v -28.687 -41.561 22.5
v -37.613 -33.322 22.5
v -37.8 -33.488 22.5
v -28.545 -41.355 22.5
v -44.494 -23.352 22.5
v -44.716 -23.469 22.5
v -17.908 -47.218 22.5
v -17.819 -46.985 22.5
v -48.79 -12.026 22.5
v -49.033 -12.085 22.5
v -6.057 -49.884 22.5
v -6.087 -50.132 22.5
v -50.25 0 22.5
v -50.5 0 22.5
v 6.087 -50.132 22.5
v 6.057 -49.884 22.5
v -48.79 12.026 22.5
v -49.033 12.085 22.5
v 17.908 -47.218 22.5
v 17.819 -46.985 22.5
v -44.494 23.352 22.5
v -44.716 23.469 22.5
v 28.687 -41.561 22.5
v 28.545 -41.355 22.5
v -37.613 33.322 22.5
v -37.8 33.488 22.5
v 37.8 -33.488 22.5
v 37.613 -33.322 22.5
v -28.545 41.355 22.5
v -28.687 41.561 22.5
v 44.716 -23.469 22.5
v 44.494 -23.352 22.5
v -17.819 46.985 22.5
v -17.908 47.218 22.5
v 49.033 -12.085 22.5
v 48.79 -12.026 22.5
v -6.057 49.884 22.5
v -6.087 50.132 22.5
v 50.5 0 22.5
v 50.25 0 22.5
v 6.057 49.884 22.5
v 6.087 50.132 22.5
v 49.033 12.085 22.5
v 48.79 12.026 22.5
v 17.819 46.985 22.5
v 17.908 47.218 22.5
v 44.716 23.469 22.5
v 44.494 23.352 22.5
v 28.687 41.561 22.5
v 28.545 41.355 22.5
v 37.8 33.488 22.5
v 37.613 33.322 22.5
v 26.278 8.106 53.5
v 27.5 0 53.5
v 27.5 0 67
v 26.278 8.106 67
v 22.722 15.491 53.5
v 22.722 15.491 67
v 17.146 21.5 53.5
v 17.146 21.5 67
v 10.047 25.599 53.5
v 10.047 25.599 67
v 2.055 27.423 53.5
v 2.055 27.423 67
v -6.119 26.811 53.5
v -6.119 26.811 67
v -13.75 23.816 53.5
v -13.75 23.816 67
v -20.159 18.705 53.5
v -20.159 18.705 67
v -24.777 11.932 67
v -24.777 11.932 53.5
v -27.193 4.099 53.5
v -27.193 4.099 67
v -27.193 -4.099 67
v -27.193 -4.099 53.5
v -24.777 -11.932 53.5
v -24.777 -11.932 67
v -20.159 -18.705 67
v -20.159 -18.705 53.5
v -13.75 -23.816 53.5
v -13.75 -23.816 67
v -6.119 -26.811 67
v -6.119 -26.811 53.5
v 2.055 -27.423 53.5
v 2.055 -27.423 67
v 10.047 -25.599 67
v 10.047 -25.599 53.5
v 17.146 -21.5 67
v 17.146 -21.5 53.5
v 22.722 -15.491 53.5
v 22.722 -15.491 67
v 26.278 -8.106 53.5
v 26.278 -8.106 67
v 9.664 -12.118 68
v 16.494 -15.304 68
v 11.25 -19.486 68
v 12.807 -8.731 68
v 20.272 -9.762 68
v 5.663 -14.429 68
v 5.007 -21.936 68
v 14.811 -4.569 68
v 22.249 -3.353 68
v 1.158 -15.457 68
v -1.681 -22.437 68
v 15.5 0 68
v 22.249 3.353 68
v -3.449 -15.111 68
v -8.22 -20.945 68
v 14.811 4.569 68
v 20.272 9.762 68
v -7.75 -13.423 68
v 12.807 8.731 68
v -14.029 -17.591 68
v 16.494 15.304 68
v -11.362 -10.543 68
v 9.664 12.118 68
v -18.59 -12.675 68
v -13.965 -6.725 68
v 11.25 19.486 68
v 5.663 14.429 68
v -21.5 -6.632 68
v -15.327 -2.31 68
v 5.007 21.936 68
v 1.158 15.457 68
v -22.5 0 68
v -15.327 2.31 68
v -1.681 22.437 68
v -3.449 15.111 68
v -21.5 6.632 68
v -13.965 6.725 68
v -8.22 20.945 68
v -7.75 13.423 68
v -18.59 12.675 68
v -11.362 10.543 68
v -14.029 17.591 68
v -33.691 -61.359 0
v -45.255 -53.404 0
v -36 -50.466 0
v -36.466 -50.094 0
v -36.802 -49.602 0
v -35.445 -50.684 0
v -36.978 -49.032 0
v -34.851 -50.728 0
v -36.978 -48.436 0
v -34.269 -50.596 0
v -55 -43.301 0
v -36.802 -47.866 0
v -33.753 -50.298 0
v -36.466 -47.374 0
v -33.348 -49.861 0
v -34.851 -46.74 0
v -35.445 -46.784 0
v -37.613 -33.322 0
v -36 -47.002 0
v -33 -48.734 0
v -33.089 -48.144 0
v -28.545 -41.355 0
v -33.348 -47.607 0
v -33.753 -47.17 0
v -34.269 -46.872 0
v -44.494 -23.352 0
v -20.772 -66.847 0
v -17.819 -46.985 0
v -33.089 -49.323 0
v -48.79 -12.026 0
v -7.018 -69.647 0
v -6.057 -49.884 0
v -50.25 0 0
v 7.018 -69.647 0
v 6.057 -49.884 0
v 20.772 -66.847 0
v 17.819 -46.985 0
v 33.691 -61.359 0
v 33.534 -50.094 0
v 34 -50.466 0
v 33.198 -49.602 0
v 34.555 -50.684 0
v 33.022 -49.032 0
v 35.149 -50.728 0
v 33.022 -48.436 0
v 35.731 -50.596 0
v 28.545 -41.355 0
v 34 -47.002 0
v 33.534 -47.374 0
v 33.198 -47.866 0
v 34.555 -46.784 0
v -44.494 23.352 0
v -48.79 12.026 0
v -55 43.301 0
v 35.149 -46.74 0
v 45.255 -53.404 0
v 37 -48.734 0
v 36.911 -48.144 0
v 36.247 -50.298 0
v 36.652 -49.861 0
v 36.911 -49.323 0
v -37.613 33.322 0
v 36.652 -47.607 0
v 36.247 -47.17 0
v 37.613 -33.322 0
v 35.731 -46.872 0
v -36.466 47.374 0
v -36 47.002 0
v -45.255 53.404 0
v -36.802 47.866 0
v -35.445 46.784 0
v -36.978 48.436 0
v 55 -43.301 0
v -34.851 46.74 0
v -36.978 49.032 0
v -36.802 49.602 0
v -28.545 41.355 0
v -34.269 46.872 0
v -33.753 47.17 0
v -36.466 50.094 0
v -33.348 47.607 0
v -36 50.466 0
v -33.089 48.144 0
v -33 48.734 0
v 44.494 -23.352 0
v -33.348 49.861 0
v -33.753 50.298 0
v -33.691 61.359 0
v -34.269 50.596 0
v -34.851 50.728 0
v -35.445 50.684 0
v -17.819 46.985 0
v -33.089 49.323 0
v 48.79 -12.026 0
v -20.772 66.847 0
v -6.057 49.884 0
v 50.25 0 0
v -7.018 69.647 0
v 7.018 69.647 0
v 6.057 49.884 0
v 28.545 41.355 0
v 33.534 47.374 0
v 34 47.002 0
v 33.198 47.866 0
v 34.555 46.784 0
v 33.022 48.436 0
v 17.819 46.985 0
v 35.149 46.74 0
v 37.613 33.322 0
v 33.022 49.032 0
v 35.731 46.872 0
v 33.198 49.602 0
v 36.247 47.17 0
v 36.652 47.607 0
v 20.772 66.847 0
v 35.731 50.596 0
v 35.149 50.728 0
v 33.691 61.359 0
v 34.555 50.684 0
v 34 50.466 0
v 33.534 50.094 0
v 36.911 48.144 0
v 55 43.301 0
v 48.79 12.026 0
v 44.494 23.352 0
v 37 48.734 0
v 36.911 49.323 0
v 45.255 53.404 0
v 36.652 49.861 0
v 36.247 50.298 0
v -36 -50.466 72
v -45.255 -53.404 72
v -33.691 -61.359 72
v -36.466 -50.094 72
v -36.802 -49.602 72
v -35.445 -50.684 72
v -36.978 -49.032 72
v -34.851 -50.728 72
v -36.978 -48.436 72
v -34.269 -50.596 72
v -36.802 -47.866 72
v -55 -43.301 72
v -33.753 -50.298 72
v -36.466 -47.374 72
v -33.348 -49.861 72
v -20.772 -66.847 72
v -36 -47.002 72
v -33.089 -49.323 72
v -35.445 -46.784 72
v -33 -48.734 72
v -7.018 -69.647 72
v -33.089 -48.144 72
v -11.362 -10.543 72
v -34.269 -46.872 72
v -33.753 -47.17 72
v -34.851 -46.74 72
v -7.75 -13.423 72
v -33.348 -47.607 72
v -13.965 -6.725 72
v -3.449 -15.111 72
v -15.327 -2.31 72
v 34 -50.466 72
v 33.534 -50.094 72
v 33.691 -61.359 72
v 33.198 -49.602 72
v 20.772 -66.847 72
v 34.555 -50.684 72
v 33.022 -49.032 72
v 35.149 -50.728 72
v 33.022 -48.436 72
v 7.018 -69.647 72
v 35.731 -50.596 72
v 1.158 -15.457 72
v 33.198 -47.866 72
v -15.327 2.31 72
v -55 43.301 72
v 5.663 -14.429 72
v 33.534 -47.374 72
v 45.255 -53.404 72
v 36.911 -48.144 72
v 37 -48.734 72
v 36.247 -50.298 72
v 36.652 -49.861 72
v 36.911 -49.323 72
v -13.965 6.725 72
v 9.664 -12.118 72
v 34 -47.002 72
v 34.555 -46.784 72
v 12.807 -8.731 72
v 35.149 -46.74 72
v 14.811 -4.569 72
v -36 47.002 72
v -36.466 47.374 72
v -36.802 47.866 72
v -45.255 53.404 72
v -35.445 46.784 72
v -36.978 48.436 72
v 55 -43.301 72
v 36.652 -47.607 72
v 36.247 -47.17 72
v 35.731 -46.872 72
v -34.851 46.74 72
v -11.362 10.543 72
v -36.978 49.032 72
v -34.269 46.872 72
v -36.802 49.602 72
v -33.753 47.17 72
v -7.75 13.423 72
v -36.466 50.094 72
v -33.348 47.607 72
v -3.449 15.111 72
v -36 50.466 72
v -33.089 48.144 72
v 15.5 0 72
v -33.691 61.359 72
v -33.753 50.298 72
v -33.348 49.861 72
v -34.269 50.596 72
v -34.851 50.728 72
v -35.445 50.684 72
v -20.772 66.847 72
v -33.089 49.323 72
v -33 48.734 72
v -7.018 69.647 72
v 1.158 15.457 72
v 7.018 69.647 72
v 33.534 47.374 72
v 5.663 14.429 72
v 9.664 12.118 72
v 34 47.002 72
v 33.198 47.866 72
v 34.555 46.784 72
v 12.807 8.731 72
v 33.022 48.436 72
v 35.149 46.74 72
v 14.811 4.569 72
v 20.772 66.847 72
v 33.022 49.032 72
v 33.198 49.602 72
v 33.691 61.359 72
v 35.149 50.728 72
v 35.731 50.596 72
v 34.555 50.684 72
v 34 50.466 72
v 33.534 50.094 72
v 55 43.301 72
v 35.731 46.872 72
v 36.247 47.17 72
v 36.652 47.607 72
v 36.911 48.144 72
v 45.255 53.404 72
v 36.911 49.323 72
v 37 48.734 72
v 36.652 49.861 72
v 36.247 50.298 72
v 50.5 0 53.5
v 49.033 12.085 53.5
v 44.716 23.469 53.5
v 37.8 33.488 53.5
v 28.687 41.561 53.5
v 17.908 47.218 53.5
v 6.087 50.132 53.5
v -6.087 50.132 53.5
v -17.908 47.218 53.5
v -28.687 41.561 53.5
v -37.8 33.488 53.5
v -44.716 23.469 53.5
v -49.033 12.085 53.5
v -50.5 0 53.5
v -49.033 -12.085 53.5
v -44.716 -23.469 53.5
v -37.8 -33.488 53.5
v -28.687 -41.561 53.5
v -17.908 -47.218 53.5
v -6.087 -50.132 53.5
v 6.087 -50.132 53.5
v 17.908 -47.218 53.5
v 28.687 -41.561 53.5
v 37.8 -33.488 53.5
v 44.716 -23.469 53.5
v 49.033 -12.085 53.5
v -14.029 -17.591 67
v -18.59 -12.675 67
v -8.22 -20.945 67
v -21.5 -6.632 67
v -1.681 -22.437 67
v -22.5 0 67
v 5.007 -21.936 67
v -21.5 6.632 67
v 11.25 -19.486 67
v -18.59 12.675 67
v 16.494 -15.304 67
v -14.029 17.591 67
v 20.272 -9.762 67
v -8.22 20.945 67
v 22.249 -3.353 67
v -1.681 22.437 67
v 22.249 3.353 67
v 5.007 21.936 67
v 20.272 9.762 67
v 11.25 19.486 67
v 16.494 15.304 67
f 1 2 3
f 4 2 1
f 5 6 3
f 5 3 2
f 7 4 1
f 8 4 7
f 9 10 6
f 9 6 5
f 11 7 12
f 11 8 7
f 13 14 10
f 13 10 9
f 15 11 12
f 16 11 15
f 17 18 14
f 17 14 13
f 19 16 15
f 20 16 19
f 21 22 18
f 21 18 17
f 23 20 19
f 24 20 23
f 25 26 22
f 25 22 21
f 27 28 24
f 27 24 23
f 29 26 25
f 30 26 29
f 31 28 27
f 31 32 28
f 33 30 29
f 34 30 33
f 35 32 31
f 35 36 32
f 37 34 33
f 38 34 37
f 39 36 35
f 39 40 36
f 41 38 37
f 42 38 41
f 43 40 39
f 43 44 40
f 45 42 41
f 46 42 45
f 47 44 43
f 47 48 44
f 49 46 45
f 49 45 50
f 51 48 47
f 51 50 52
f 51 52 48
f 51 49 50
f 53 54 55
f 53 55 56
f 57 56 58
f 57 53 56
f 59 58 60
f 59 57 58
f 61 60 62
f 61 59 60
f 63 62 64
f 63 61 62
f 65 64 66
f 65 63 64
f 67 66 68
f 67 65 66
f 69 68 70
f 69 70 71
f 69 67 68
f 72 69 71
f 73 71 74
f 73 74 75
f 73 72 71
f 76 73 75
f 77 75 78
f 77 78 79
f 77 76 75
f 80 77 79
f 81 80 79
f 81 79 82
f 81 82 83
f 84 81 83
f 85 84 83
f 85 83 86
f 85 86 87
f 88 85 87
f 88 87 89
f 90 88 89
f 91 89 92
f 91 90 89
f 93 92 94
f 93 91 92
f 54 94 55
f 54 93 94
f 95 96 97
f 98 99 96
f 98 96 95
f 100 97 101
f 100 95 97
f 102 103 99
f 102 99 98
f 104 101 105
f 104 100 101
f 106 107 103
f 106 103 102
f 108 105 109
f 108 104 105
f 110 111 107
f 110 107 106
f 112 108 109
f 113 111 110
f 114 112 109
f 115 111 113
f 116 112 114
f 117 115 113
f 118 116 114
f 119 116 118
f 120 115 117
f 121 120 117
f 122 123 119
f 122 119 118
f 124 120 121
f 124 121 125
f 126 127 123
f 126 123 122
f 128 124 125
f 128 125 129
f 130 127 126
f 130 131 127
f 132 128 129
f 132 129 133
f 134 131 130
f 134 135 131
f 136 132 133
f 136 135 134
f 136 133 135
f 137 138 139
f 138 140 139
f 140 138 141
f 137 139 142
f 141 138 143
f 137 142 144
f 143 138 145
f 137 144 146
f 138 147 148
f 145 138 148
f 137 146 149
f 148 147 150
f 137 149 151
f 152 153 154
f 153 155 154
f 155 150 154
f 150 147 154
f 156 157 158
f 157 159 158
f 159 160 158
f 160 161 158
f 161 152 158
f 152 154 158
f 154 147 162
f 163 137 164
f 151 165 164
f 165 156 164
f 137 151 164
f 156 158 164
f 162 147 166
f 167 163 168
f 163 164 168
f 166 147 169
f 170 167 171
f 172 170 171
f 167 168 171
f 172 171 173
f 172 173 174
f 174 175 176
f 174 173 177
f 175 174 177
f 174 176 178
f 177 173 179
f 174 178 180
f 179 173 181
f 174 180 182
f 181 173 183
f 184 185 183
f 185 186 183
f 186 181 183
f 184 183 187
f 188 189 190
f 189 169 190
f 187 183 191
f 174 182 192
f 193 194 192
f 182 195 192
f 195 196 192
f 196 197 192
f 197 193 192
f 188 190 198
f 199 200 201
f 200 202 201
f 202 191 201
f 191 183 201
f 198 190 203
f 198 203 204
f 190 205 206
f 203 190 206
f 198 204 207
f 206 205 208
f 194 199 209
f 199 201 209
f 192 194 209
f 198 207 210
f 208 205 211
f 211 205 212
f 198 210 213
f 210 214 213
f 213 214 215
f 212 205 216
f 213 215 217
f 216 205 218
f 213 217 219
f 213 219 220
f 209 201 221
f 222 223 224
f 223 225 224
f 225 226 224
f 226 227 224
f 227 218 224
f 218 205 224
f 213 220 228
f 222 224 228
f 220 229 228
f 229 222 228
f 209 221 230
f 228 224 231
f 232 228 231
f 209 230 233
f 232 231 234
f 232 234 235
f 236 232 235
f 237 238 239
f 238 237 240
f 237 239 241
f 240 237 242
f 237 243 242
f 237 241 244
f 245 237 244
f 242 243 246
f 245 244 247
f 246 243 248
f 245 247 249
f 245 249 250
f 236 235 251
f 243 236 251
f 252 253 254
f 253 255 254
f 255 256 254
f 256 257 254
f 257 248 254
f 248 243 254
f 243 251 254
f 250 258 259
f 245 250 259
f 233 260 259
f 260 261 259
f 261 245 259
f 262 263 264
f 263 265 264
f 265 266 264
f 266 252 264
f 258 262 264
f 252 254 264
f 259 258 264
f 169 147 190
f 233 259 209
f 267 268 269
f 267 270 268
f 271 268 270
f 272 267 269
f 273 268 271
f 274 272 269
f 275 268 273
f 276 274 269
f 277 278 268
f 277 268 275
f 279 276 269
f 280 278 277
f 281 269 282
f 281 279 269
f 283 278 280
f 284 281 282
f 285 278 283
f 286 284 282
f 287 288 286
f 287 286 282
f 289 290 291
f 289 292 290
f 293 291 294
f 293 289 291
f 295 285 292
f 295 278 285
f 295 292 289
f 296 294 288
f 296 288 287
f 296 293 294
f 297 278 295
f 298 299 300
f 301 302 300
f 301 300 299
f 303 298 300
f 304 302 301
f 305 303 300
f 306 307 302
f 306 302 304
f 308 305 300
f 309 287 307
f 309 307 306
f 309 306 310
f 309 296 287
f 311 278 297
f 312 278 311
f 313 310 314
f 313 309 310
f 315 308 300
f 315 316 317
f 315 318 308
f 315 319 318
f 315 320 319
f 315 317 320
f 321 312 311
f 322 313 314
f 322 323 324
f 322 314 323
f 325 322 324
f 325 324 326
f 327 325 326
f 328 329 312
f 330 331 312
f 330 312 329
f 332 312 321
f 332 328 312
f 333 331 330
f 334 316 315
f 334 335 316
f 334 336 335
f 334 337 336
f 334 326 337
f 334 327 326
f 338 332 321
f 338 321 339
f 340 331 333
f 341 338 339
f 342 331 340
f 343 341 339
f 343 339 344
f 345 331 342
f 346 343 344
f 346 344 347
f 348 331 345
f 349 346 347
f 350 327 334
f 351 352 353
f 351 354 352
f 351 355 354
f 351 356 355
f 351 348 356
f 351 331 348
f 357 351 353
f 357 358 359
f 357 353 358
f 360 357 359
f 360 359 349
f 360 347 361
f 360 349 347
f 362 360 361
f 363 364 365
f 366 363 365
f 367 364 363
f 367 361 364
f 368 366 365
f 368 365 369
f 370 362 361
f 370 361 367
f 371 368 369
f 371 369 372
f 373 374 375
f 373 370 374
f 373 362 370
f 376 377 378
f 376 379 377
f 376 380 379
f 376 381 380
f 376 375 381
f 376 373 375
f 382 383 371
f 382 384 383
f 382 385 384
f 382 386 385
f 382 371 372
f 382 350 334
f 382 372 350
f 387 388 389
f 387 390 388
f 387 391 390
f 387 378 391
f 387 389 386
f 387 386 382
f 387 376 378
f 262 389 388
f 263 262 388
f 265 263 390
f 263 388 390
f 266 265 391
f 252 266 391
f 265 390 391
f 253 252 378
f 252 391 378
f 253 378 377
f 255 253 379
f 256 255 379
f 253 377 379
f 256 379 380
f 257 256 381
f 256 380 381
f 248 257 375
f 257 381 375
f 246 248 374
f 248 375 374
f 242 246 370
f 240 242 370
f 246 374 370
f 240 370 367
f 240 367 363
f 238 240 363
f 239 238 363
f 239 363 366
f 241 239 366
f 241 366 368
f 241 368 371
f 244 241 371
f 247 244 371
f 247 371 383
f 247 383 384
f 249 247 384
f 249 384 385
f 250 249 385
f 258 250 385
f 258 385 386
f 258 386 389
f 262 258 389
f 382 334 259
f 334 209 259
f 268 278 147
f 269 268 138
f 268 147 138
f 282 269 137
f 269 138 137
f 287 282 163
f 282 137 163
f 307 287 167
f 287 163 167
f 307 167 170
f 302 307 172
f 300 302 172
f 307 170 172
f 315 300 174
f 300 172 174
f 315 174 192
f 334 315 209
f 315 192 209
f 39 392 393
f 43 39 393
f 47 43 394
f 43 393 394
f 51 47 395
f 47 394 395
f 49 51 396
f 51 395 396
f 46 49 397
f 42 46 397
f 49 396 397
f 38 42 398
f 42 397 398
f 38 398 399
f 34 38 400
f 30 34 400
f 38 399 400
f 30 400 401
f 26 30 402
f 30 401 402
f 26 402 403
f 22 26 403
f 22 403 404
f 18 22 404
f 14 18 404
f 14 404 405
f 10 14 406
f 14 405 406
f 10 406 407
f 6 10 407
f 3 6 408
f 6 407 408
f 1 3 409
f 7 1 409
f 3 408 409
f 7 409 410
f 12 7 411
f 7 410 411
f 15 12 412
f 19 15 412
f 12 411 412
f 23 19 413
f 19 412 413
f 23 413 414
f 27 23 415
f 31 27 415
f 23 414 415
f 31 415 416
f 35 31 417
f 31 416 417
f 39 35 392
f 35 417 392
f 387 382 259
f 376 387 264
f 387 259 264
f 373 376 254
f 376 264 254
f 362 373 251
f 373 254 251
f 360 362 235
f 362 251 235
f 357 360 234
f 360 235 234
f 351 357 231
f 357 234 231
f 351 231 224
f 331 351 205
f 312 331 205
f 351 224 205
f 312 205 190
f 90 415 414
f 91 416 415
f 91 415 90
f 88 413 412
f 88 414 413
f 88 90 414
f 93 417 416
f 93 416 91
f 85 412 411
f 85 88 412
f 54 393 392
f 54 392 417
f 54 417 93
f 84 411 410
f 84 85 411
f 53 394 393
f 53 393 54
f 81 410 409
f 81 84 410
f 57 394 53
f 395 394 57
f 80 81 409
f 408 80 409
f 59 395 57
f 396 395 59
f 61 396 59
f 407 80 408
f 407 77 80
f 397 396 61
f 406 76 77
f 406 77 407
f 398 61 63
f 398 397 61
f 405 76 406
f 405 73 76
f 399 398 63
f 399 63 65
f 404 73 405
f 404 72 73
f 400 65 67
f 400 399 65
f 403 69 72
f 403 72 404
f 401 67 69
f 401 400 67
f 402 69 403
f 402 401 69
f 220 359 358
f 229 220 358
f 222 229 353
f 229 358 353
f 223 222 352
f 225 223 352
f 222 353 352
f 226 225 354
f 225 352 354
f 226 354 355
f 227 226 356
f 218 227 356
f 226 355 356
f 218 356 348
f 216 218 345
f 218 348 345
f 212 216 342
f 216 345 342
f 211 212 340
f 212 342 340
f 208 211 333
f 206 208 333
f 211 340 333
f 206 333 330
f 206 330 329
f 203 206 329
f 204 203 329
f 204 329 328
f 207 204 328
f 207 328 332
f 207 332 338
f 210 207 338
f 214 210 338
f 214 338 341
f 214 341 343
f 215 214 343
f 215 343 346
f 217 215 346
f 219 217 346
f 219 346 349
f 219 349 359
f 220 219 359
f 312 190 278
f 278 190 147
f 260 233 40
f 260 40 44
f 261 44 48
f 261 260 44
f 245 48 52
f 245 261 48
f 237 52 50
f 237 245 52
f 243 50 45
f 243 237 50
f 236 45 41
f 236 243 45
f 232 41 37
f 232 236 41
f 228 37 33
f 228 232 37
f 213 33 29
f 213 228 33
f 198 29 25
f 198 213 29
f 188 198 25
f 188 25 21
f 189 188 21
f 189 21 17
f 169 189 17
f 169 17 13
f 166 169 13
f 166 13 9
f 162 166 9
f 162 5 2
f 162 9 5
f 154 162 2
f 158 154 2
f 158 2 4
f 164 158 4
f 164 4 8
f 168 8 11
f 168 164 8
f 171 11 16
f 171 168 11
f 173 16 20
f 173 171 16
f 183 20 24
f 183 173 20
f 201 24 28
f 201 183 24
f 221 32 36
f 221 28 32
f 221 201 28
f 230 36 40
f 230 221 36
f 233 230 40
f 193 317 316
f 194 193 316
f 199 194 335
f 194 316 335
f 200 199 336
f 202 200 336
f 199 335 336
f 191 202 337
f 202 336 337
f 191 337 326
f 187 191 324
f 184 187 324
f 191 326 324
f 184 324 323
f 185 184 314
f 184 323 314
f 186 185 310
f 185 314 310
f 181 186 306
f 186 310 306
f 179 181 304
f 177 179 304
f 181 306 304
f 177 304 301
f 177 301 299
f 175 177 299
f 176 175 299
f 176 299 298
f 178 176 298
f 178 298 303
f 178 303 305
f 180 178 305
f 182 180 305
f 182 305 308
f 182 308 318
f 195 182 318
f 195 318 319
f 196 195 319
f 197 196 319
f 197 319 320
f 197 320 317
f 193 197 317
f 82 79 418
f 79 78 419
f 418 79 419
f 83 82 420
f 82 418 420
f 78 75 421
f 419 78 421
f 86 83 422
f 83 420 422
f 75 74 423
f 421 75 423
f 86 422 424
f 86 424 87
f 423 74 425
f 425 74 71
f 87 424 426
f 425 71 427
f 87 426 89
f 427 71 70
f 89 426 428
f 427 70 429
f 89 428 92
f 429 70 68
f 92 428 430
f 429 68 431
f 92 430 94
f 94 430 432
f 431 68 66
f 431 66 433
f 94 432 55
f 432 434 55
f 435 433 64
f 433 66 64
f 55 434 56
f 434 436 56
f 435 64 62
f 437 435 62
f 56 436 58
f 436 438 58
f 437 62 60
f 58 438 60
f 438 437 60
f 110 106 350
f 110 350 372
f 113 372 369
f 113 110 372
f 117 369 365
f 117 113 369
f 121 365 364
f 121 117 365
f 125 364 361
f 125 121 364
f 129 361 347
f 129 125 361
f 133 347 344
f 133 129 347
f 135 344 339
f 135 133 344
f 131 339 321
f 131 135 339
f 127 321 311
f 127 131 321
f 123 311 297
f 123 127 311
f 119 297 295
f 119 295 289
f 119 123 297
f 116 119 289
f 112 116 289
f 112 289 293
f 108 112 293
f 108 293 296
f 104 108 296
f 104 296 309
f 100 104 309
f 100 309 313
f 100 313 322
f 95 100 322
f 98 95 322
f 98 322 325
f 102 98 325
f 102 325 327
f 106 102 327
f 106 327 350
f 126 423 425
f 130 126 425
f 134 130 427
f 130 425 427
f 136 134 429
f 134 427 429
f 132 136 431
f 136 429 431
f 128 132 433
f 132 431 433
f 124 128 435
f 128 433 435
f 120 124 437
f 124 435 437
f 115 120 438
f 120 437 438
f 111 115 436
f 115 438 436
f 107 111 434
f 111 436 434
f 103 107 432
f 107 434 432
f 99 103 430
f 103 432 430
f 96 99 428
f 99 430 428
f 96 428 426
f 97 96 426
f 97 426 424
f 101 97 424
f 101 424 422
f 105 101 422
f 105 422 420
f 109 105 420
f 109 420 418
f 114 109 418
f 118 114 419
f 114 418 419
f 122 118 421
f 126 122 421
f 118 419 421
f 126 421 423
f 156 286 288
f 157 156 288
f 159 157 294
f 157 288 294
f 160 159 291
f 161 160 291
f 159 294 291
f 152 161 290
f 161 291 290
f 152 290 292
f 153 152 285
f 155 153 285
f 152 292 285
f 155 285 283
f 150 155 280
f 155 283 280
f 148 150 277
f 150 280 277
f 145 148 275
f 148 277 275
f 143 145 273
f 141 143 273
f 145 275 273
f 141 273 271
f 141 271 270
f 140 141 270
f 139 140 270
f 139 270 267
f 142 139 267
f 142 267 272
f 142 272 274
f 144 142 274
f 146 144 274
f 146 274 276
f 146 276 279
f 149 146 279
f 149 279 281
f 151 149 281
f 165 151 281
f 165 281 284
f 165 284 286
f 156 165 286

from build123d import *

# Parameters (mm, degrees)
SKETCH1_R           = 50.25
BOSS_EXTRUDE1_DEPTH = 53.5
SKETCH2_R           = 50.5
CUT_EXTRUDE1_DEPTH  = 31
SKETCH3_R           = 27.5
BOSS_EXTRUDE2_DEPTH = 13.5
SKETCH8_R           = 15.5
BOSS_EXTRUDE4_DEPTH = 5
SKETCH9_R           = 2
CUT_EXTRUDE5_DEPTH  = 115.494541355
SKETCH10_R          = 22.5
CUT_EXTRUDE6_DEPTH  = 1


with BuildPart() as part:
    # Sketch1 → Boss-Extrude1 (new body)
    with BuildSketch(Plane.XY):
        with BuildLine():
            Line((-55, 43.301270189), (-55, -43.301270189))
            ThreePointArc((-55, -43.301270189), (0, -70), (55, -43.301270189))
            Line((55, -43.301270189), (55, 43.301270189))
            ThreePointArc((55, 43.301270189), (0, 70), (-55, 43.301270189))
        make_face()
        Circle(SKETCH1_R, mode=Mode.SUBTRACT)
    extrude(amount=BOSS_EXTRUDE1_DEPTH)

    # Sketch2 → Cut-Extrude1 (cut)
    with BuildSketch(Plane.XY.offset(53.5)):
        Circle(SKETCH2_R)
    extrude(amount=-CUT_EXTRUDE1_DEPTH, mode=Mode.SUBTRACT)

    # Sketch3 → Boss-Extrude2 (add)
    with BuildSketch(Plane.XY.offset(53.5)):
        with BuildLine():
            Line((-55, -43.301270189), (-55, 43.301270189))
            ThreePointArc((-55, 43.301270189), (0, 70), (55, 43.301270189))
            Line((55, 43.301270189), (55, -43.301270189))
            ThreePointArc((55, -43.301270189), (0, -70), (-55, -43.301270189))
        make_face()
        Circle(SKETCH3_R, mode=Mode.SUBTRACT)
    extrude(amount=BOSS_EXTRUDE2_DEPTH)

    # Sketch8 → Boss-Extrude4 (add)
    with BuildSketch(Plane.XY.offset(67)):
        with BuildLine():
            Line((-55, 43.301270189), (-55, -43.301270189))
            ThreePointArc((-55, -43.301270189), (0, -70), (55, -43.301270189))
            Line((55, -43.301270189), (55, 43.301270189))
            ThreePointArc((55, 43.301270189), (0, 70), (-55, 43.301270189))
        make_face()
        Circle(SKETCH8_R, mode=Mode.SUBTRACT)
    extrude(amount=BOSS_EXTRUDE4_DEPTH)

    # Sketch9 → Cut-Extrude5 (cut, through all)
    with BuildSketch(Plane.XY.offset(72)):
        with Locations((-35, -48.733971724)):
            Circle(SKETCH9_R)
        with Locations((-35, 48.733971724)):
            Circle(SKETCH9_R)
        with Locations((35, 48.733971724)):
            Circle(SKETCH9_R)
        with Locations((35, -48.733971724)):
            Circle(SKETCH9_R)
    extrude(amount=-CUT_EXTRUDE5_DEPTH, mode=Mode.SUBTRACT)

    # Sketch10 → Cut-Extrude6 (cut)
    with BuildSketch(Plane(origin=(0, 0, 67), x_dir=(-1, 0, 0), z_dir=(0, 0, -1))):
        Circle(SKETCH10_R)
    extrude(amount=-CUT_EXTRUDE6_DEPTH, mode=Mode.SUBTRACT)


solid = part.part
